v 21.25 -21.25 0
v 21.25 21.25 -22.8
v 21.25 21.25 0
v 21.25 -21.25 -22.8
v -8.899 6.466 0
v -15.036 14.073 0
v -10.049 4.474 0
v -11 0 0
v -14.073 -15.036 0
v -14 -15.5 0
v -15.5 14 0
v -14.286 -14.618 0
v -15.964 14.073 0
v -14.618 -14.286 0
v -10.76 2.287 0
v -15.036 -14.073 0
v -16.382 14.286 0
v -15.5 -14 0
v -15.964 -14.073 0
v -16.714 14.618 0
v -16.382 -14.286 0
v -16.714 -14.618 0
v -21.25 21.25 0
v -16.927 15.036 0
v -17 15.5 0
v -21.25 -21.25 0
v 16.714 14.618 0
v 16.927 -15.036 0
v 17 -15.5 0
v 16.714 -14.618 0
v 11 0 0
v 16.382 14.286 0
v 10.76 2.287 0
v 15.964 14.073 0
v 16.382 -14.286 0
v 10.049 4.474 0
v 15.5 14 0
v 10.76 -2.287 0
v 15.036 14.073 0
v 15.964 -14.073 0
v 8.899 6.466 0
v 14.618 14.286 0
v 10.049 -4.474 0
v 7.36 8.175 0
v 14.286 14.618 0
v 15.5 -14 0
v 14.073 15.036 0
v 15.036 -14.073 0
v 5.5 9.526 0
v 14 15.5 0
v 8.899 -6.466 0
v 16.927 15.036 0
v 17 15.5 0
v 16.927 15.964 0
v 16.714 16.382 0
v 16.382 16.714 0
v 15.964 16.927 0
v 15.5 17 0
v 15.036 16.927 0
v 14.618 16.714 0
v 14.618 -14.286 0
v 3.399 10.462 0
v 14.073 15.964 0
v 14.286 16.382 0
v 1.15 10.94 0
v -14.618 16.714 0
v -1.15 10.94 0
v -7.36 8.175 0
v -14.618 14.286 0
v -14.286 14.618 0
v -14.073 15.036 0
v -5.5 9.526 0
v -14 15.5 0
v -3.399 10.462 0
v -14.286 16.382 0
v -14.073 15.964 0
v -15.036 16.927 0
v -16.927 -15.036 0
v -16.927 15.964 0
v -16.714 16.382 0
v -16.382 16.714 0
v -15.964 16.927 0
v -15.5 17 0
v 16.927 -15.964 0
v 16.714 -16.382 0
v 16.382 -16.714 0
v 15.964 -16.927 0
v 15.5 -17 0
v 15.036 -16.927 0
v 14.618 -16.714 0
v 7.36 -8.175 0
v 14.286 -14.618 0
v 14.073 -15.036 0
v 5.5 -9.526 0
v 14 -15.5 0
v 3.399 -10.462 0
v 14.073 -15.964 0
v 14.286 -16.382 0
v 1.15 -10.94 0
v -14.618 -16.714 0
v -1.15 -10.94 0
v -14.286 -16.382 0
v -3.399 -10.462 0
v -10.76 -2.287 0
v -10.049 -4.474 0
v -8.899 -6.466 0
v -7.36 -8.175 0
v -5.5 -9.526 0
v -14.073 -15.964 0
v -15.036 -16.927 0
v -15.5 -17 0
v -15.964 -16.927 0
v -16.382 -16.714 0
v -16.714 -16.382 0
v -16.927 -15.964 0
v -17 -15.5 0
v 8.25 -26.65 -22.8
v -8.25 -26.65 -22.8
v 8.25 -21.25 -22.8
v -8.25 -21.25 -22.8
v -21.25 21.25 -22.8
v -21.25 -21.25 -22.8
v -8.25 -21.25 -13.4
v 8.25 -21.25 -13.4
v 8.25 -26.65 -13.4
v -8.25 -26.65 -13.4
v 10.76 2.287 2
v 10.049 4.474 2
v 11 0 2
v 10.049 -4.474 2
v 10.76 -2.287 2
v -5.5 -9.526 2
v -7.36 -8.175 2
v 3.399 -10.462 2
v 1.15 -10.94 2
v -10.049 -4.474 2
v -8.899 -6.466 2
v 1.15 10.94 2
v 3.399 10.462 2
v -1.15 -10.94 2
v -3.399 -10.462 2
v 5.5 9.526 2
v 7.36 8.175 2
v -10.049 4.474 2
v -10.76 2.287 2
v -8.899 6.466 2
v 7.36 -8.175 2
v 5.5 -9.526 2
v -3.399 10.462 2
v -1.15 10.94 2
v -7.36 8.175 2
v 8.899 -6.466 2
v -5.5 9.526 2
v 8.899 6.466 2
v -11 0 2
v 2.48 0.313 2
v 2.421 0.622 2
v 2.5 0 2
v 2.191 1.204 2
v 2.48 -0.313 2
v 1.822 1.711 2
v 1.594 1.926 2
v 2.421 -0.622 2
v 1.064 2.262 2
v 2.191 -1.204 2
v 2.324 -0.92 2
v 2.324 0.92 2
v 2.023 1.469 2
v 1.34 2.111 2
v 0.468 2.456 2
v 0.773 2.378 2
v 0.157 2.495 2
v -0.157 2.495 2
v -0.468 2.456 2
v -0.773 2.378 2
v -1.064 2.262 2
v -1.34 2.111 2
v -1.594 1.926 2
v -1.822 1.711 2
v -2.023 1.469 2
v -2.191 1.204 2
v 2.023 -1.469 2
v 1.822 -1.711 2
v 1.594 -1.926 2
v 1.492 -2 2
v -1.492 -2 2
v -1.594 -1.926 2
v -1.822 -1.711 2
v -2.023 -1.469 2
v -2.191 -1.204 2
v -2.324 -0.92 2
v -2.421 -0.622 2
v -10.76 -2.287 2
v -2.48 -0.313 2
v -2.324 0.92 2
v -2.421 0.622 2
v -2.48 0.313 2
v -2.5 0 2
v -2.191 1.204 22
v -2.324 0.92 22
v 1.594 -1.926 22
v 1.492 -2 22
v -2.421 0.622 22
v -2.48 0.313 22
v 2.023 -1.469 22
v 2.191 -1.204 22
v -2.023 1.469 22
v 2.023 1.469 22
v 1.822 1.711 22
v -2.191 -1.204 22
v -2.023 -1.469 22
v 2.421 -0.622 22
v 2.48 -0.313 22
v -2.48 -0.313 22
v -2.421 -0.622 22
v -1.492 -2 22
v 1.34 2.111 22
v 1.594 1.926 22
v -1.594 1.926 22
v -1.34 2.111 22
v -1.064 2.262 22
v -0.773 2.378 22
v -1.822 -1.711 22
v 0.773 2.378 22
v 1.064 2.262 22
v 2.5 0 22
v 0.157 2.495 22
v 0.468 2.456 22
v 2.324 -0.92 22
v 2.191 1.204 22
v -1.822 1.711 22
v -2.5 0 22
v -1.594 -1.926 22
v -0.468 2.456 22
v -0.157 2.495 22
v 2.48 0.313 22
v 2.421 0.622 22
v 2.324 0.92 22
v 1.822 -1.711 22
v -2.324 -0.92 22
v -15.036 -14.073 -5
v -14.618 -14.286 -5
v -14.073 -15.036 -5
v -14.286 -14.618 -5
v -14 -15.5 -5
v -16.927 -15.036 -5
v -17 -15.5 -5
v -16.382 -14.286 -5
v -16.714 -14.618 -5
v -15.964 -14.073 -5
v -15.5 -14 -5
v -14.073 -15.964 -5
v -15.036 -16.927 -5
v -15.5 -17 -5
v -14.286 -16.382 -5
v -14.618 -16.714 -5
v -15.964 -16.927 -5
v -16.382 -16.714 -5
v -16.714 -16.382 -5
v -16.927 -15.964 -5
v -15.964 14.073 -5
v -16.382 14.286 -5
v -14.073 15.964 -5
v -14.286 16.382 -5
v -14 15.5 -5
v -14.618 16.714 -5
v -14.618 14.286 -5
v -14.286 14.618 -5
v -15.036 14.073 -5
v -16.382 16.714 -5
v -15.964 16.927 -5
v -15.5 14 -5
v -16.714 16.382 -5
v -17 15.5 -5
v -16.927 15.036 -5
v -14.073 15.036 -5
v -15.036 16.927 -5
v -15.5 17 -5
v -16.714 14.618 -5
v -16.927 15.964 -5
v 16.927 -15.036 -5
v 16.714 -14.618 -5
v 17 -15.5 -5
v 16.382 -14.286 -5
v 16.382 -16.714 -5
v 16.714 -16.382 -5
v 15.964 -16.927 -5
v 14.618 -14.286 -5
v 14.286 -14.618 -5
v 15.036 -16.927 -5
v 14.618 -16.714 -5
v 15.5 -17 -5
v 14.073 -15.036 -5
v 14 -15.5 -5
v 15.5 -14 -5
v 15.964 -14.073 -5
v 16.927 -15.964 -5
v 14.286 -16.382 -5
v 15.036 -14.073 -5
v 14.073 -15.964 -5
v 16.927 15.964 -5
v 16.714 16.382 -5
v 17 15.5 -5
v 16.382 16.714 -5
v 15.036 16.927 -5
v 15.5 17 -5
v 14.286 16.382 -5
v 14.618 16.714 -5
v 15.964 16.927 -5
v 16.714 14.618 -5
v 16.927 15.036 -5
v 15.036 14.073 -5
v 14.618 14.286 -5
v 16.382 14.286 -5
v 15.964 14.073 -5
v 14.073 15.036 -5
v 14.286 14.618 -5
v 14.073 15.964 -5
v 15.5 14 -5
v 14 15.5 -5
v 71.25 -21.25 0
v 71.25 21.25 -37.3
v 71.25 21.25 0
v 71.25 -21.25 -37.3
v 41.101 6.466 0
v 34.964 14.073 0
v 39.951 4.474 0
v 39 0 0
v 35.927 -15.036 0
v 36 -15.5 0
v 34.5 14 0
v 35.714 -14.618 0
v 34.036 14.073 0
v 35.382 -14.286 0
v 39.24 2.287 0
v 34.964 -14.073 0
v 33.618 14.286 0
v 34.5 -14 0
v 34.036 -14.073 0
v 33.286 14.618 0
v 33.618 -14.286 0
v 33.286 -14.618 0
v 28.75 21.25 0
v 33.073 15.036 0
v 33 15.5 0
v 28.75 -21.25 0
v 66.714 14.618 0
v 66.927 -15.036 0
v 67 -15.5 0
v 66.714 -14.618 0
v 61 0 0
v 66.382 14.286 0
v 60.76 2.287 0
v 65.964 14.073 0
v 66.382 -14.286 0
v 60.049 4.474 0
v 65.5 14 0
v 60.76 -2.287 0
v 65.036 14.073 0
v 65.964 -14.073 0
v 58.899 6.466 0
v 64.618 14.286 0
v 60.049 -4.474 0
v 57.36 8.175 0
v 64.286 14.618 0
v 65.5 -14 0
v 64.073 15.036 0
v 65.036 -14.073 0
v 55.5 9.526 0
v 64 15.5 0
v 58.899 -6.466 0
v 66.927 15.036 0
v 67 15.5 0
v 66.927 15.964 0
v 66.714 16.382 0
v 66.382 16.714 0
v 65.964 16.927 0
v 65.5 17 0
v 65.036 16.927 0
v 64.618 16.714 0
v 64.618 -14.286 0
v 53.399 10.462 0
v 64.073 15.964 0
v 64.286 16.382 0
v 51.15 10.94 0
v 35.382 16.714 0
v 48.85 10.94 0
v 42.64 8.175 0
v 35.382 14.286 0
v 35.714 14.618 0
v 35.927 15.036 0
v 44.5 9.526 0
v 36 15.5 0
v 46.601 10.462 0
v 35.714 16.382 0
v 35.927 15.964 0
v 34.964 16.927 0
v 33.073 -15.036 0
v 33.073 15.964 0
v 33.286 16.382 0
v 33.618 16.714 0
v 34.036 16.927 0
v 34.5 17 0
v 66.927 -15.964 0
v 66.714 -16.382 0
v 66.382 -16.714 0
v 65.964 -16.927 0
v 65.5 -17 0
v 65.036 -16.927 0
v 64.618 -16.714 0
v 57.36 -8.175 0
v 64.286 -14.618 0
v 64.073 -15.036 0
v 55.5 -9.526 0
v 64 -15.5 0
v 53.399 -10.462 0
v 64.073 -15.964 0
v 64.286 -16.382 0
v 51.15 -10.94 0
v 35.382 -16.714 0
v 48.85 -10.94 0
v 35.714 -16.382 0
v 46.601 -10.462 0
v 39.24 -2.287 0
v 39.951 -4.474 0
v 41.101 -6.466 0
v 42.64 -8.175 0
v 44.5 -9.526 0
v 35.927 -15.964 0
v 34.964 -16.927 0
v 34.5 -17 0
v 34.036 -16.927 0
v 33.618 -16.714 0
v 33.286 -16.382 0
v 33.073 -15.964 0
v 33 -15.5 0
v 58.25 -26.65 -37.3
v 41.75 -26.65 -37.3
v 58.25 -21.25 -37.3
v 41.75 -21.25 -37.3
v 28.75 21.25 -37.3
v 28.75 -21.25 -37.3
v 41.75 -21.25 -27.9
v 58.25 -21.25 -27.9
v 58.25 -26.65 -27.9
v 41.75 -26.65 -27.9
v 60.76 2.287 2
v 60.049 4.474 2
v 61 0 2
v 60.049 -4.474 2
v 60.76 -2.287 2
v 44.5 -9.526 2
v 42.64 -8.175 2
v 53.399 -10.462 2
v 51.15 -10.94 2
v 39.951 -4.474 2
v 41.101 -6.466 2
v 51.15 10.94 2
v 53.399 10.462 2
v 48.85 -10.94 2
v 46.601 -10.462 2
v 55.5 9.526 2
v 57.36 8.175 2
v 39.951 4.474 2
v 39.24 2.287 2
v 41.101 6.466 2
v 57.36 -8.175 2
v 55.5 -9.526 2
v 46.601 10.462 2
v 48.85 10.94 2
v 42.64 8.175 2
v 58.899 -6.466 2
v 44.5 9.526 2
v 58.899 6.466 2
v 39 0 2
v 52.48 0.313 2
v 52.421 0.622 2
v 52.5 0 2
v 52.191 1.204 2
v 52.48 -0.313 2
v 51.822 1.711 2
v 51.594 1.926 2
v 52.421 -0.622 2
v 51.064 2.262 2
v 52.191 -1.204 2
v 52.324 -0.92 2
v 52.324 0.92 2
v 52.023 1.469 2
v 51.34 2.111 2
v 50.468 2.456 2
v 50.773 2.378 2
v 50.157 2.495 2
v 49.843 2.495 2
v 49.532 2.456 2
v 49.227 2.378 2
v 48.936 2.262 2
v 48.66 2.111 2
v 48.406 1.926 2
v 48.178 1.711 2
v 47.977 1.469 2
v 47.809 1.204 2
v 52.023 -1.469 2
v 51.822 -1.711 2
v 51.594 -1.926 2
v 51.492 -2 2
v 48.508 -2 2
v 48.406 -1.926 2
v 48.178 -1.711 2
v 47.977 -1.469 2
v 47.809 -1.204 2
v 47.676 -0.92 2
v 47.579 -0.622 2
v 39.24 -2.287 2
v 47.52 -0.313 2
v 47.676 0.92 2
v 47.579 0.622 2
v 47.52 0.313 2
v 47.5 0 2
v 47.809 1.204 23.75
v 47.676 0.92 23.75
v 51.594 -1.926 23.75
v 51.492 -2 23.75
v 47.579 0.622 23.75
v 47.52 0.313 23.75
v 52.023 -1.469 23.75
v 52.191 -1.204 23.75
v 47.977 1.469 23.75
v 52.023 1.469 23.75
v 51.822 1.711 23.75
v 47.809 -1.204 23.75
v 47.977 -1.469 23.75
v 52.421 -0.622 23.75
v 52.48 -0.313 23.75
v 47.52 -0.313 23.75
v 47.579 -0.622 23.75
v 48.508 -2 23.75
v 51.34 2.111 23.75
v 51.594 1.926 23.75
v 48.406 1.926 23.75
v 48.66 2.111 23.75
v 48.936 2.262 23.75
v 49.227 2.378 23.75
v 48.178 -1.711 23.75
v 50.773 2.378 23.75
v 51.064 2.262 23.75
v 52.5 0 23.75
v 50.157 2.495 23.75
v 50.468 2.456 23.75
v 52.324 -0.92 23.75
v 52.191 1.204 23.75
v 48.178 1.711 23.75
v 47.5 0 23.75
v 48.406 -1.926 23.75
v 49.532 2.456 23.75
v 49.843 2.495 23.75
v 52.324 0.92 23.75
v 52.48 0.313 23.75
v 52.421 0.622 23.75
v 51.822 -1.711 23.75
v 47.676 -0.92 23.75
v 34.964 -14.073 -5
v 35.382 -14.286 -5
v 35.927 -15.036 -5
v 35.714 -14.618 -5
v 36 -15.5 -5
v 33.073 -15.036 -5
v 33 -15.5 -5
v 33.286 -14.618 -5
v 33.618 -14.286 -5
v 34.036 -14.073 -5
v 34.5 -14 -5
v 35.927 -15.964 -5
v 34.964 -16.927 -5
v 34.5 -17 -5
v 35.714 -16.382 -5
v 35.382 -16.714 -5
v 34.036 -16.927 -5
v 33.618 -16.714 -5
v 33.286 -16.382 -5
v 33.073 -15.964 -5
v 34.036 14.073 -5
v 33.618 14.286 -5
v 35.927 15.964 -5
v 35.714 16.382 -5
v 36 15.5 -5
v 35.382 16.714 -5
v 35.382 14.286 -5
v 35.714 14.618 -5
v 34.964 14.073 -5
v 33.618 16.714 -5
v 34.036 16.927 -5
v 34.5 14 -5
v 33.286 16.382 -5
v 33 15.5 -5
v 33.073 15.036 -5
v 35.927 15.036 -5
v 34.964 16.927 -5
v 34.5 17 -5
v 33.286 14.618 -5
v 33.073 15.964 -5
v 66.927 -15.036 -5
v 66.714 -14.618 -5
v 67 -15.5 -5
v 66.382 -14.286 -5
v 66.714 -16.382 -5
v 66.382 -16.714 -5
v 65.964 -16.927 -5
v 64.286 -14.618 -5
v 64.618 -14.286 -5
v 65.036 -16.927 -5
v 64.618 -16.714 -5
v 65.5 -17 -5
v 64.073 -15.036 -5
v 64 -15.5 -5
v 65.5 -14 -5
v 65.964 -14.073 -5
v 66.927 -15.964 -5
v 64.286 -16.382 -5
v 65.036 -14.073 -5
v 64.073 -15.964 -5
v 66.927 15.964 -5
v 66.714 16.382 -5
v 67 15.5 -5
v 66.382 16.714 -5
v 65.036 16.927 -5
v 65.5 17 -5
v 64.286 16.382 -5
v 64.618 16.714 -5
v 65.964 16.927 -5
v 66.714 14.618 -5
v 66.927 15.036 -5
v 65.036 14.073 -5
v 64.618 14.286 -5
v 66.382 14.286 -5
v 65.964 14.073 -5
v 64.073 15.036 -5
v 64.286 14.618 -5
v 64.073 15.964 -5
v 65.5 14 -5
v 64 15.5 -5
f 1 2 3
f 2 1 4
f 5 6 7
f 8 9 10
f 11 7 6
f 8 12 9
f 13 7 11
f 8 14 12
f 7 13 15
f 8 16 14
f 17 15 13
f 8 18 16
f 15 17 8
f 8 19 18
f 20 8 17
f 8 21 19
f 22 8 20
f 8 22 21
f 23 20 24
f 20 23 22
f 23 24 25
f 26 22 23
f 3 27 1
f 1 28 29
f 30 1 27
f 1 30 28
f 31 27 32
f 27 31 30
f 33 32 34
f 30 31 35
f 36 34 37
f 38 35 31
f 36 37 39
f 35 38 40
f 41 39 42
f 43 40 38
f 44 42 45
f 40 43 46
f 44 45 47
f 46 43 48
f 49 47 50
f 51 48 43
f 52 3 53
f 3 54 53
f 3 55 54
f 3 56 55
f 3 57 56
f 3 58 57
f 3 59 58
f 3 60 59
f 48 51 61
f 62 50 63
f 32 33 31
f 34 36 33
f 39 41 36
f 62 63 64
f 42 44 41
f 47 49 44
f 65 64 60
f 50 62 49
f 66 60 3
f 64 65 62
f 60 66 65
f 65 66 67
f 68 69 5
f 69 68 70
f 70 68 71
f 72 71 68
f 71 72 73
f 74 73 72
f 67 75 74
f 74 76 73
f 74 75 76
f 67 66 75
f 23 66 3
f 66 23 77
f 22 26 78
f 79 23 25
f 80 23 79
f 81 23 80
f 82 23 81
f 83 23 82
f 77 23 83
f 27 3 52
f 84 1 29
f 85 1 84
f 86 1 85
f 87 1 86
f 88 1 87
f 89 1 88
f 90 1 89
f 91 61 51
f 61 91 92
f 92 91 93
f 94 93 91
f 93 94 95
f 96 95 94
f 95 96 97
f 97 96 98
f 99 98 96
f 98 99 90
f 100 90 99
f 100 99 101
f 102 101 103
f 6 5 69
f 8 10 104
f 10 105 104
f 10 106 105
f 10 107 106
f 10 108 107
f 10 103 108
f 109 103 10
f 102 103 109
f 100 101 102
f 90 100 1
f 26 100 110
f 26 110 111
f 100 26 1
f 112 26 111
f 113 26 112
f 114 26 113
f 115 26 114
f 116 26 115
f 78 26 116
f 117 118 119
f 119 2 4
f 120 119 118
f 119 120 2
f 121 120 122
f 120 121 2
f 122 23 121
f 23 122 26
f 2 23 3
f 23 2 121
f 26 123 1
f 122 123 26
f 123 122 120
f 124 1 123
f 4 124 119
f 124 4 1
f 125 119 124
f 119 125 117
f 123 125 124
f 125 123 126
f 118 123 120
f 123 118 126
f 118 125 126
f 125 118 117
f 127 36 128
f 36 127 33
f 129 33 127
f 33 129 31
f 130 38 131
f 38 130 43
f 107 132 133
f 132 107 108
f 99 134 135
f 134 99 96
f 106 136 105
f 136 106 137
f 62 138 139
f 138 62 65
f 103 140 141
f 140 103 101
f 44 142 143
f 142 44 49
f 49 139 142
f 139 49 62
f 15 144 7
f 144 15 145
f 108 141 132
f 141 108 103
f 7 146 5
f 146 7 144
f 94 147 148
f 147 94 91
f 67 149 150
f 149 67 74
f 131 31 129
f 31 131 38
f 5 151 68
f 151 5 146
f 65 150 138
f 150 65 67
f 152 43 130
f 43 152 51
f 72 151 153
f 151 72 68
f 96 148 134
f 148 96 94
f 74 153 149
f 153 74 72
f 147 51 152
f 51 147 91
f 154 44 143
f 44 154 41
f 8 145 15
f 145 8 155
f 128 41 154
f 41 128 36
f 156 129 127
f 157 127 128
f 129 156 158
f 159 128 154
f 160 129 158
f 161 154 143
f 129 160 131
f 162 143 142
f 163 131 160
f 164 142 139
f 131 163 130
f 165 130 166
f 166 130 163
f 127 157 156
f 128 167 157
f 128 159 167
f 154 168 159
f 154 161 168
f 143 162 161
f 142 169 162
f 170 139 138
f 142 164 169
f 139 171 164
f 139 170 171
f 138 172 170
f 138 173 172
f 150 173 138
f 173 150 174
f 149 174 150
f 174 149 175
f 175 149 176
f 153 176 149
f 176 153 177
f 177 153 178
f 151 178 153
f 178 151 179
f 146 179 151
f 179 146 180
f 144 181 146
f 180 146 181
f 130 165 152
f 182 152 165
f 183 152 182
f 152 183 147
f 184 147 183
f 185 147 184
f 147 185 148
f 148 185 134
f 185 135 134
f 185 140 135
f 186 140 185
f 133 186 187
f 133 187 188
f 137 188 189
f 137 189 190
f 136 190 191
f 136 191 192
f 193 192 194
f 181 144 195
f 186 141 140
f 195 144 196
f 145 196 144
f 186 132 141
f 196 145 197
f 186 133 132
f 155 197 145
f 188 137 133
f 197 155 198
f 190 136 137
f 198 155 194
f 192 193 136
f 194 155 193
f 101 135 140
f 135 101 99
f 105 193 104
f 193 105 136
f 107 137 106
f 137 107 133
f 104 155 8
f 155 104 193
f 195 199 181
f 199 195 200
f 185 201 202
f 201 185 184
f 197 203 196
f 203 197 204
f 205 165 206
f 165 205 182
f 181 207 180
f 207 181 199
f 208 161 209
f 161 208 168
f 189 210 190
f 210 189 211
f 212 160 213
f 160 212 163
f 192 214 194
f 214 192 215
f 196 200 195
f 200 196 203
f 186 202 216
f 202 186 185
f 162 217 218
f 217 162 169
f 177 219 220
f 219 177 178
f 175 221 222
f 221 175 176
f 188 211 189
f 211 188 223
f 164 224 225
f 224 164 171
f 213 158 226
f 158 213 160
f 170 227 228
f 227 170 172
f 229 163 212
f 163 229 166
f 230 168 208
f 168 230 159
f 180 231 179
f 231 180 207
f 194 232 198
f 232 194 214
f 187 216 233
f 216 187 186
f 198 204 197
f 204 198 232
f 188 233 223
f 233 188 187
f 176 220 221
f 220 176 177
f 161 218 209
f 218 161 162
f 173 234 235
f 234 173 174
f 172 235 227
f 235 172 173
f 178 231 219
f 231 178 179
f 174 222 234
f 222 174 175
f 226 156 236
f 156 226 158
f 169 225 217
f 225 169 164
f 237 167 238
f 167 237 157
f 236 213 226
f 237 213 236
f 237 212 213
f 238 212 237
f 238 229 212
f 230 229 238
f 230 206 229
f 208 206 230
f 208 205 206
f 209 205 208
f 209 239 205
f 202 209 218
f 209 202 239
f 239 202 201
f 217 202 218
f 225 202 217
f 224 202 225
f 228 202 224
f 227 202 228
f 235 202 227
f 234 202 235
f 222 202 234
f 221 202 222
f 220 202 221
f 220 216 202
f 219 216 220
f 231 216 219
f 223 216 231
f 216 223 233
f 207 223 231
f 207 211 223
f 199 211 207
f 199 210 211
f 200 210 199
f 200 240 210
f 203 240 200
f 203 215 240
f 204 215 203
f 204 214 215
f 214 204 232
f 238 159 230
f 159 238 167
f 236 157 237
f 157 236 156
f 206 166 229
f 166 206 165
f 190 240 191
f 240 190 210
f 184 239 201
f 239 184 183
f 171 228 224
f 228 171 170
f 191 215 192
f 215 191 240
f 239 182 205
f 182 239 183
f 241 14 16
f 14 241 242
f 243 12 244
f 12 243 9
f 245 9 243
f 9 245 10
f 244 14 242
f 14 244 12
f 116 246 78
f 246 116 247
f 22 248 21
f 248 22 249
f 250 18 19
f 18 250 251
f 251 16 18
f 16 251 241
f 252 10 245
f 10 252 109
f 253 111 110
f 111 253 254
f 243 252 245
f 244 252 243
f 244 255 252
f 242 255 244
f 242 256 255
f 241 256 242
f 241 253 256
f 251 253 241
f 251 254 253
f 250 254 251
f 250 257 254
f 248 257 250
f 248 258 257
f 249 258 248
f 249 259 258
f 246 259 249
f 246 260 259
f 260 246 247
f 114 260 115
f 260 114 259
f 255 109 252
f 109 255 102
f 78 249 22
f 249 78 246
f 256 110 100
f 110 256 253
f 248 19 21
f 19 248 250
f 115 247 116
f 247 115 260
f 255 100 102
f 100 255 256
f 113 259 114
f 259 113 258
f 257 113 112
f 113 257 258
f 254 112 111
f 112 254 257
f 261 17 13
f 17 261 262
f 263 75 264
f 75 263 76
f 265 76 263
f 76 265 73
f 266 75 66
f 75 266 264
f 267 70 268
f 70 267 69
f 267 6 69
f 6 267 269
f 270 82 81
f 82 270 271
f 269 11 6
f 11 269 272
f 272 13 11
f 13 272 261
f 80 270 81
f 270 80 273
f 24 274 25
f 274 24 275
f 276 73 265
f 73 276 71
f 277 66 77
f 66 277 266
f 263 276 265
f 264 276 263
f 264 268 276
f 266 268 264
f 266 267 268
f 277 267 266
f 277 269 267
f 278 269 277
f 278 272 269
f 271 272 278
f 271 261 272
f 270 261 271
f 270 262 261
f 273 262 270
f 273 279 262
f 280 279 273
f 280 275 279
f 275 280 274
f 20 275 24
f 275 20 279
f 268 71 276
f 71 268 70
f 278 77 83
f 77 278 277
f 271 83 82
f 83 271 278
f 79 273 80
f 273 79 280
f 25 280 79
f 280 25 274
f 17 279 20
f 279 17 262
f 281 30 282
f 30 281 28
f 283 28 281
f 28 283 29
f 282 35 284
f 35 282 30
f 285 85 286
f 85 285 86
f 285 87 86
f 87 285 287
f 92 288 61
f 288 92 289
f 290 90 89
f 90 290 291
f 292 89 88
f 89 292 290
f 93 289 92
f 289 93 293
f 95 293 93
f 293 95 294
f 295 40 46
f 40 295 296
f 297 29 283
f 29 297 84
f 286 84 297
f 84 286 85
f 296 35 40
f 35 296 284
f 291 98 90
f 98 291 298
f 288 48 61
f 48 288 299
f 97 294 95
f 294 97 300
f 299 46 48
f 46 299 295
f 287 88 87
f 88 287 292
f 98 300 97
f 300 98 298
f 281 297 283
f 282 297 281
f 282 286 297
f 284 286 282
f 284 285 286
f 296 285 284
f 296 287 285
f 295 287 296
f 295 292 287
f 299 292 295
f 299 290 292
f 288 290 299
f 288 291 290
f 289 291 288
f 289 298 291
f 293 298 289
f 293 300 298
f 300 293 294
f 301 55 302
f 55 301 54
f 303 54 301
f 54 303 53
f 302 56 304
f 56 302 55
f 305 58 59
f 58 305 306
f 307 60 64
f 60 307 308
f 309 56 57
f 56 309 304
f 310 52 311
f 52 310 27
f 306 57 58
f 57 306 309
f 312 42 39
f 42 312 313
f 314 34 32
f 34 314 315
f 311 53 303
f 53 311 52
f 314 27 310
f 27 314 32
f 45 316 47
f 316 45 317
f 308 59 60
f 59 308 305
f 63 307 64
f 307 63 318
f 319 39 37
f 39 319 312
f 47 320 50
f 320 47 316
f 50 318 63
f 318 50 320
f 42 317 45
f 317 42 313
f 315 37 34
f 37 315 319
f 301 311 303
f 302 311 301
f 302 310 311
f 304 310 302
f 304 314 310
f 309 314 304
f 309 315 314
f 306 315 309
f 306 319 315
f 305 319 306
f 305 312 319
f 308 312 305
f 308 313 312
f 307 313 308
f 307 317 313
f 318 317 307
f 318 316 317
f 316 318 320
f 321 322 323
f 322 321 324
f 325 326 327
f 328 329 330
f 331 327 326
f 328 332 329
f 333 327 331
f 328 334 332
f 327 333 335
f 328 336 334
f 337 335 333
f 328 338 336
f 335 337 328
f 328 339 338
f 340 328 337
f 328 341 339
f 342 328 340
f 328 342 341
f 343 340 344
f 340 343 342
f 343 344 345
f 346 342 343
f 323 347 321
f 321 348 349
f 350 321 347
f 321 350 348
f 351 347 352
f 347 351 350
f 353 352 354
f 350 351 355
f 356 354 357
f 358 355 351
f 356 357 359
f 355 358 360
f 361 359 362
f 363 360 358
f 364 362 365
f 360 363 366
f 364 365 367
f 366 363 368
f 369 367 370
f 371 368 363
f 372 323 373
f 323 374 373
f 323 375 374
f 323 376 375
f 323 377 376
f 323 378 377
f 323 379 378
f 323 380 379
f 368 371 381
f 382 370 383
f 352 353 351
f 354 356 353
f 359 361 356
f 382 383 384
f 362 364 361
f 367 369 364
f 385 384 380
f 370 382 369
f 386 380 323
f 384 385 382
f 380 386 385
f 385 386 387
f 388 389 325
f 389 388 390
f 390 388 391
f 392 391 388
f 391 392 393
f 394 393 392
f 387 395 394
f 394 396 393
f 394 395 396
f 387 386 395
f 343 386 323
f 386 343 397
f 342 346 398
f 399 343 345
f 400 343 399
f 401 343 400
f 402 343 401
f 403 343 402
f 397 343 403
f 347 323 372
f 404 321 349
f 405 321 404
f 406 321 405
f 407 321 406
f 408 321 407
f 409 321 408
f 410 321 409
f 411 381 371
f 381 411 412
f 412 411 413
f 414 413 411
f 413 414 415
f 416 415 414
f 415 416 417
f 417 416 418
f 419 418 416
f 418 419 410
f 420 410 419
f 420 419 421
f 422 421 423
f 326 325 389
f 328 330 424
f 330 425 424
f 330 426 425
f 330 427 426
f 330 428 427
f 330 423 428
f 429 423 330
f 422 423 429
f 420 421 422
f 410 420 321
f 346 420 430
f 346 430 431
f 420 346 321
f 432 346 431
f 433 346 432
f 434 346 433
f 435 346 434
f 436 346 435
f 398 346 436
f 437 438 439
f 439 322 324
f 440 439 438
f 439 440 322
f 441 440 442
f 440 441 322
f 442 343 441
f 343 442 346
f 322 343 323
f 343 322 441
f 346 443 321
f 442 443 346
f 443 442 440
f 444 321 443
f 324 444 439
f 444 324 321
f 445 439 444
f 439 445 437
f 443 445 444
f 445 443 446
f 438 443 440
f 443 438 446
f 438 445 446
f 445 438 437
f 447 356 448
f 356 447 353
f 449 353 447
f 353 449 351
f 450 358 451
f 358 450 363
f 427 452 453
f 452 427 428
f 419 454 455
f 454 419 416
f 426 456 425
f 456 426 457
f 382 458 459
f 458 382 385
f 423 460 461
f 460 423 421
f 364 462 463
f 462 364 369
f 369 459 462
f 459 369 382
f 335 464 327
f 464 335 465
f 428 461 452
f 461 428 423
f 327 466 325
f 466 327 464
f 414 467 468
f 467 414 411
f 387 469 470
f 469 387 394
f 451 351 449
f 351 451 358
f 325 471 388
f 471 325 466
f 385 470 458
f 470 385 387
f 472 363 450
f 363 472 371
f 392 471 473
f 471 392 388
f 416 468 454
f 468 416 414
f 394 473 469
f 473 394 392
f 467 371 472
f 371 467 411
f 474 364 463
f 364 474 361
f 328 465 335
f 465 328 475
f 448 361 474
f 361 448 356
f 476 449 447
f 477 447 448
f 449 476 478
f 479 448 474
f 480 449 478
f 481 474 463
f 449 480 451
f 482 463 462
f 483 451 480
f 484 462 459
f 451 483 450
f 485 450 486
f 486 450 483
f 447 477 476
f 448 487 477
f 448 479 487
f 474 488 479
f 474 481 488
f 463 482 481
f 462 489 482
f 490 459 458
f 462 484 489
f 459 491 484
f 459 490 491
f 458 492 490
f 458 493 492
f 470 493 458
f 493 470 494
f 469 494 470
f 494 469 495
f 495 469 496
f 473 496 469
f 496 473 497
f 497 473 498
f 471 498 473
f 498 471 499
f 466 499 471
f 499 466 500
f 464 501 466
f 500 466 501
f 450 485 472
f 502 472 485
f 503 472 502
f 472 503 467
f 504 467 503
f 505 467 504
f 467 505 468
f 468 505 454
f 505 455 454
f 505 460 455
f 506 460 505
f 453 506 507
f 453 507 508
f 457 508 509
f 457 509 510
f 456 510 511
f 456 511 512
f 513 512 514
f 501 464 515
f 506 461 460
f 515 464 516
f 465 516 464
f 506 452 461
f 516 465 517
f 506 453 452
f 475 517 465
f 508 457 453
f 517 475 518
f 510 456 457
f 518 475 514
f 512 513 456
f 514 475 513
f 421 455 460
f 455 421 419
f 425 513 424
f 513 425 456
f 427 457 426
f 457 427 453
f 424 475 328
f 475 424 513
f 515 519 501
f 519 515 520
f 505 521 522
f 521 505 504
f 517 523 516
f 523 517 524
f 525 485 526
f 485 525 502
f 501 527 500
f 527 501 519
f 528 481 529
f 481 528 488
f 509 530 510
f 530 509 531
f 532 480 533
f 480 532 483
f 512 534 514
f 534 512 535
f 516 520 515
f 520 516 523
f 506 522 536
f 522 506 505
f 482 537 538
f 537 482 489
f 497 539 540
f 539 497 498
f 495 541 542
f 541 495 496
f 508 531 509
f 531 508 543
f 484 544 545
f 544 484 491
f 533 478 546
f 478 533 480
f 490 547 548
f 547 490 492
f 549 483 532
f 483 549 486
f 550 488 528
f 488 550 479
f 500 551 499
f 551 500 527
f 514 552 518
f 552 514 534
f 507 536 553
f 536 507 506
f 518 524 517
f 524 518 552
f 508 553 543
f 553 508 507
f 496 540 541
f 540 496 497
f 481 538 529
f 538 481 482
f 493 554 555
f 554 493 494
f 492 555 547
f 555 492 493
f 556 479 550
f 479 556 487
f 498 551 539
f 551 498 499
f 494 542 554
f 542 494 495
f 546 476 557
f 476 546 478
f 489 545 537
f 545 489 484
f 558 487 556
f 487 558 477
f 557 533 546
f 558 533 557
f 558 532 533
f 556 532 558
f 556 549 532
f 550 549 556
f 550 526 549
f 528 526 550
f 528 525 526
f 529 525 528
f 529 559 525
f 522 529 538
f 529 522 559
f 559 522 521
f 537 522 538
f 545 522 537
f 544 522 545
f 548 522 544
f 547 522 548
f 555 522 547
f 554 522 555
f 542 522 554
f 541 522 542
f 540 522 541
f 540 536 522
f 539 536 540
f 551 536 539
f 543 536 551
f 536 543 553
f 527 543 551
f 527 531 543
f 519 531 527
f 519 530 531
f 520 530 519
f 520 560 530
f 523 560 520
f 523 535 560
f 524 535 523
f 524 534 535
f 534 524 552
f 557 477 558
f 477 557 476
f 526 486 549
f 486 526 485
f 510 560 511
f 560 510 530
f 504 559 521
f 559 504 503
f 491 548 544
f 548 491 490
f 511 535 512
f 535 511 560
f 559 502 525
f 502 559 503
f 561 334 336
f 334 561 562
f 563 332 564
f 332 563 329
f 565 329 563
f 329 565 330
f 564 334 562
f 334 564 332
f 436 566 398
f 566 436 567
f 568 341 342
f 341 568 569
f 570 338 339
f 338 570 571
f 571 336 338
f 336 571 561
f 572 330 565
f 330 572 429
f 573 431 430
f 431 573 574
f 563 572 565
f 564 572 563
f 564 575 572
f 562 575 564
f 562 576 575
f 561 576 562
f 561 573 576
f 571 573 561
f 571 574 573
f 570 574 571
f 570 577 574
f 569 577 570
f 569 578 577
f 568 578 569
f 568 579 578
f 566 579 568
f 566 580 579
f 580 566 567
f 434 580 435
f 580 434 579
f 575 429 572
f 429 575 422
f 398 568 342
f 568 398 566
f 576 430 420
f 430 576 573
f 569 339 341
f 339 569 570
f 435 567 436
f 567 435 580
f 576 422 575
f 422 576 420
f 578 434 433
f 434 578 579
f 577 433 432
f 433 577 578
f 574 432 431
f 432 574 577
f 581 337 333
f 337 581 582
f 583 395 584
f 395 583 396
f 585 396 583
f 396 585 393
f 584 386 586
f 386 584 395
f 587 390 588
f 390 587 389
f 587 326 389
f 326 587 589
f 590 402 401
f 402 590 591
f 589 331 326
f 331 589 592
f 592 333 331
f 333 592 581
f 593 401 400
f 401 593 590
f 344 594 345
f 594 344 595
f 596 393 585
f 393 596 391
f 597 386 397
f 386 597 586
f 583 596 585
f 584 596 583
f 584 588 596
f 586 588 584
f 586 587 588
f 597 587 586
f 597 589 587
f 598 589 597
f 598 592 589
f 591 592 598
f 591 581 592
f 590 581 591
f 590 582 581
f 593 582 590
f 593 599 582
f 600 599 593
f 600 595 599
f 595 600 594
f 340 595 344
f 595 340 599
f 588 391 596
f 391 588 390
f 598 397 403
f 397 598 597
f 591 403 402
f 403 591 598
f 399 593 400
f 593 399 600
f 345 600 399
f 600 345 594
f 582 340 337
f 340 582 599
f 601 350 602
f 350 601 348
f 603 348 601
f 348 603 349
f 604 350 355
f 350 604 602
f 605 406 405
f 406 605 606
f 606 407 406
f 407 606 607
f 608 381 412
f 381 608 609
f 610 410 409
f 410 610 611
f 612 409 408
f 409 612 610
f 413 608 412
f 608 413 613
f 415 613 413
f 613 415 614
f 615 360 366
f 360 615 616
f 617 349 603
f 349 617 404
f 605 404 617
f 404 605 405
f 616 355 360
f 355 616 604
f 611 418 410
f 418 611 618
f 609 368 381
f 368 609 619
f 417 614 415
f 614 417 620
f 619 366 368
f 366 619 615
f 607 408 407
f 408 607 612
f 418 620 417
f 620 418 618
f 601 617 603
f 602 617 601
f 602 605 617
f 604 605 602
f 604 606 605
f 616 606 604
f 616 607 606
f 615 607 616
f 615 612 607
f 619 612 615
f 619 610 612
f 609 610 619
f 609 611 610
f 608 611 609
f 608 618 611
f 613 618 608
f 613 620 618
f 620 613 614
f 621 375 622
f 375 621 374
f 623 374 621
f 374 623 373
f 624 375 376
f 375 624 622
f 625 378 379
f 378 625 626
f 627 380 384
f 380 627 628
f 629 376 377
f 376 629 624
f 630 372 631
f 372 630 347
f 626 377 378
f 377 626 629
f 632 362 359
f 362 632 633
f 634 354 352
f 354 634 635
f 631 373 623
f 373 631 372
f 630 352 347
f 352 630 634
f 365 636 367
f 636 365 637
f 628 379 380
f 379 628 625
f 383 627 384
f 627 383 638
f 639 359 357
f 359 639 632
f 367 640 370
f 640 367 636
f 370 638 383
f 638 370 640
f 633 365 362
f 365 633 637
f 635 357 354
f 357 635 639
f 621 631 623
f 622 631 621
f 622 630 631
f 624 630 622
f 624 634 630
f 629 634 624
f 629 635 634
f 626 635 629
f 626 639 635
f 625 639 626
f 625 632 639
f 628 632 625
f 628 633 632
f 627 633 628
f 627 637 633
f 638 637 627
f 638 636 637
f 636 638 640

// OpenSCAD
// file: ../../fn.scad
// return:
// x - for small values
// some fraction of x (>=16) - for larger values
function fn_preview_(x) = min( max(16, 0.2*x), x );
assert( fn_preview_(10) == 10 );
assert( fn_preview_(16) == 16 );
assert( fn_preview_(90)  > 16 );

// helper functions to define $fn=... to do less precise math
// in a preview mode. example usage:
//   sphere(r=50, $fn=fn(1000));
// would generate $fn=1000 when generating model, but $fn < 1000
// for preview mode. note that for small $fn's value is untouched.
function fn(x) = $preview ? fn_preview_(x) : x;
// main file
use <../../fn.scad>

eps = 0.01;


module nema17_stepper_mount_holes_template(h)
{
  span = 31;
  for(ix=[-1, +1])
    for(iy=[-1, +1])
      translate(span/2*[ix, iy, 0] + [0, 0, h])
        children();
}


module nema17_stepper_shaft_slot(h, spacing)
{
  d = 5;
  cut = 0.5;
  linear_extrude(h)
    offset(delta=spacing)
      difference()
      {
        circle(d=d, $fn=fn(50));
        translate([-d/2, -3/2*d +cut])
          square([d, d]);
      }
}


module nema17_stepper_mock(h, rod_len, mounts_at_zero=false)
{
  module body()
  {
    side = 42.5;
    translate(-0.5*[side, side, 0])
      cube([side, side, h]);
    // power connector
    {
      pc_size = [16.5, 5.4, 9.4];
      translate([-0.5*pc_size[0], -side/2-pc_size.y, 0])
        cube(pc_size);
    }
    // center berring cover
    cbh = 2;
    translate([0, 0, h])
      cylinder(d=22, h=cbh, $fn=fn(30));
    nema17_stepper_shaft_slot(h = h + cbh + rod_len, spacing=0);
  }

  translate([0, 0, (mounts_at_zero?-1:0)*h])
  difference()
  {
    body();
    nema17_stepper_mount_holes_template(h=h)
      translate([0, 0, -5])
        cylinder(d=3, h=5+eps, $fn=fn(20));
  }
}

// 12[V]
// 0.7[A]
// 0.16[Nm]
// 200[tpr]
module nema17_stepper_mock_17hs4023(mounts_at_zero=false)
{
  nema17_stepper_mock(h=22.8, rod_len=20, mounts_at_zero=mounts_at_zero);
}

// 12[V]
// 1.5[A]
// 0.42[Nm]
// 200[tpr]
module nema17_stepper_mock_17hs4401(mounts_at_zero=false)
{
  nema17_stepper_mock(h=37.3, rod_len=21.75, mounts_at_zero=mounts_at_zero);
}


//rotate([0, -90, 0])
nema17_stepper_mock_17hs4023(mounts_at_zero=true);

translate([50, 0, 0])
  nema17_stepper_mock_17hs4401(mounts_at_zero=true);
